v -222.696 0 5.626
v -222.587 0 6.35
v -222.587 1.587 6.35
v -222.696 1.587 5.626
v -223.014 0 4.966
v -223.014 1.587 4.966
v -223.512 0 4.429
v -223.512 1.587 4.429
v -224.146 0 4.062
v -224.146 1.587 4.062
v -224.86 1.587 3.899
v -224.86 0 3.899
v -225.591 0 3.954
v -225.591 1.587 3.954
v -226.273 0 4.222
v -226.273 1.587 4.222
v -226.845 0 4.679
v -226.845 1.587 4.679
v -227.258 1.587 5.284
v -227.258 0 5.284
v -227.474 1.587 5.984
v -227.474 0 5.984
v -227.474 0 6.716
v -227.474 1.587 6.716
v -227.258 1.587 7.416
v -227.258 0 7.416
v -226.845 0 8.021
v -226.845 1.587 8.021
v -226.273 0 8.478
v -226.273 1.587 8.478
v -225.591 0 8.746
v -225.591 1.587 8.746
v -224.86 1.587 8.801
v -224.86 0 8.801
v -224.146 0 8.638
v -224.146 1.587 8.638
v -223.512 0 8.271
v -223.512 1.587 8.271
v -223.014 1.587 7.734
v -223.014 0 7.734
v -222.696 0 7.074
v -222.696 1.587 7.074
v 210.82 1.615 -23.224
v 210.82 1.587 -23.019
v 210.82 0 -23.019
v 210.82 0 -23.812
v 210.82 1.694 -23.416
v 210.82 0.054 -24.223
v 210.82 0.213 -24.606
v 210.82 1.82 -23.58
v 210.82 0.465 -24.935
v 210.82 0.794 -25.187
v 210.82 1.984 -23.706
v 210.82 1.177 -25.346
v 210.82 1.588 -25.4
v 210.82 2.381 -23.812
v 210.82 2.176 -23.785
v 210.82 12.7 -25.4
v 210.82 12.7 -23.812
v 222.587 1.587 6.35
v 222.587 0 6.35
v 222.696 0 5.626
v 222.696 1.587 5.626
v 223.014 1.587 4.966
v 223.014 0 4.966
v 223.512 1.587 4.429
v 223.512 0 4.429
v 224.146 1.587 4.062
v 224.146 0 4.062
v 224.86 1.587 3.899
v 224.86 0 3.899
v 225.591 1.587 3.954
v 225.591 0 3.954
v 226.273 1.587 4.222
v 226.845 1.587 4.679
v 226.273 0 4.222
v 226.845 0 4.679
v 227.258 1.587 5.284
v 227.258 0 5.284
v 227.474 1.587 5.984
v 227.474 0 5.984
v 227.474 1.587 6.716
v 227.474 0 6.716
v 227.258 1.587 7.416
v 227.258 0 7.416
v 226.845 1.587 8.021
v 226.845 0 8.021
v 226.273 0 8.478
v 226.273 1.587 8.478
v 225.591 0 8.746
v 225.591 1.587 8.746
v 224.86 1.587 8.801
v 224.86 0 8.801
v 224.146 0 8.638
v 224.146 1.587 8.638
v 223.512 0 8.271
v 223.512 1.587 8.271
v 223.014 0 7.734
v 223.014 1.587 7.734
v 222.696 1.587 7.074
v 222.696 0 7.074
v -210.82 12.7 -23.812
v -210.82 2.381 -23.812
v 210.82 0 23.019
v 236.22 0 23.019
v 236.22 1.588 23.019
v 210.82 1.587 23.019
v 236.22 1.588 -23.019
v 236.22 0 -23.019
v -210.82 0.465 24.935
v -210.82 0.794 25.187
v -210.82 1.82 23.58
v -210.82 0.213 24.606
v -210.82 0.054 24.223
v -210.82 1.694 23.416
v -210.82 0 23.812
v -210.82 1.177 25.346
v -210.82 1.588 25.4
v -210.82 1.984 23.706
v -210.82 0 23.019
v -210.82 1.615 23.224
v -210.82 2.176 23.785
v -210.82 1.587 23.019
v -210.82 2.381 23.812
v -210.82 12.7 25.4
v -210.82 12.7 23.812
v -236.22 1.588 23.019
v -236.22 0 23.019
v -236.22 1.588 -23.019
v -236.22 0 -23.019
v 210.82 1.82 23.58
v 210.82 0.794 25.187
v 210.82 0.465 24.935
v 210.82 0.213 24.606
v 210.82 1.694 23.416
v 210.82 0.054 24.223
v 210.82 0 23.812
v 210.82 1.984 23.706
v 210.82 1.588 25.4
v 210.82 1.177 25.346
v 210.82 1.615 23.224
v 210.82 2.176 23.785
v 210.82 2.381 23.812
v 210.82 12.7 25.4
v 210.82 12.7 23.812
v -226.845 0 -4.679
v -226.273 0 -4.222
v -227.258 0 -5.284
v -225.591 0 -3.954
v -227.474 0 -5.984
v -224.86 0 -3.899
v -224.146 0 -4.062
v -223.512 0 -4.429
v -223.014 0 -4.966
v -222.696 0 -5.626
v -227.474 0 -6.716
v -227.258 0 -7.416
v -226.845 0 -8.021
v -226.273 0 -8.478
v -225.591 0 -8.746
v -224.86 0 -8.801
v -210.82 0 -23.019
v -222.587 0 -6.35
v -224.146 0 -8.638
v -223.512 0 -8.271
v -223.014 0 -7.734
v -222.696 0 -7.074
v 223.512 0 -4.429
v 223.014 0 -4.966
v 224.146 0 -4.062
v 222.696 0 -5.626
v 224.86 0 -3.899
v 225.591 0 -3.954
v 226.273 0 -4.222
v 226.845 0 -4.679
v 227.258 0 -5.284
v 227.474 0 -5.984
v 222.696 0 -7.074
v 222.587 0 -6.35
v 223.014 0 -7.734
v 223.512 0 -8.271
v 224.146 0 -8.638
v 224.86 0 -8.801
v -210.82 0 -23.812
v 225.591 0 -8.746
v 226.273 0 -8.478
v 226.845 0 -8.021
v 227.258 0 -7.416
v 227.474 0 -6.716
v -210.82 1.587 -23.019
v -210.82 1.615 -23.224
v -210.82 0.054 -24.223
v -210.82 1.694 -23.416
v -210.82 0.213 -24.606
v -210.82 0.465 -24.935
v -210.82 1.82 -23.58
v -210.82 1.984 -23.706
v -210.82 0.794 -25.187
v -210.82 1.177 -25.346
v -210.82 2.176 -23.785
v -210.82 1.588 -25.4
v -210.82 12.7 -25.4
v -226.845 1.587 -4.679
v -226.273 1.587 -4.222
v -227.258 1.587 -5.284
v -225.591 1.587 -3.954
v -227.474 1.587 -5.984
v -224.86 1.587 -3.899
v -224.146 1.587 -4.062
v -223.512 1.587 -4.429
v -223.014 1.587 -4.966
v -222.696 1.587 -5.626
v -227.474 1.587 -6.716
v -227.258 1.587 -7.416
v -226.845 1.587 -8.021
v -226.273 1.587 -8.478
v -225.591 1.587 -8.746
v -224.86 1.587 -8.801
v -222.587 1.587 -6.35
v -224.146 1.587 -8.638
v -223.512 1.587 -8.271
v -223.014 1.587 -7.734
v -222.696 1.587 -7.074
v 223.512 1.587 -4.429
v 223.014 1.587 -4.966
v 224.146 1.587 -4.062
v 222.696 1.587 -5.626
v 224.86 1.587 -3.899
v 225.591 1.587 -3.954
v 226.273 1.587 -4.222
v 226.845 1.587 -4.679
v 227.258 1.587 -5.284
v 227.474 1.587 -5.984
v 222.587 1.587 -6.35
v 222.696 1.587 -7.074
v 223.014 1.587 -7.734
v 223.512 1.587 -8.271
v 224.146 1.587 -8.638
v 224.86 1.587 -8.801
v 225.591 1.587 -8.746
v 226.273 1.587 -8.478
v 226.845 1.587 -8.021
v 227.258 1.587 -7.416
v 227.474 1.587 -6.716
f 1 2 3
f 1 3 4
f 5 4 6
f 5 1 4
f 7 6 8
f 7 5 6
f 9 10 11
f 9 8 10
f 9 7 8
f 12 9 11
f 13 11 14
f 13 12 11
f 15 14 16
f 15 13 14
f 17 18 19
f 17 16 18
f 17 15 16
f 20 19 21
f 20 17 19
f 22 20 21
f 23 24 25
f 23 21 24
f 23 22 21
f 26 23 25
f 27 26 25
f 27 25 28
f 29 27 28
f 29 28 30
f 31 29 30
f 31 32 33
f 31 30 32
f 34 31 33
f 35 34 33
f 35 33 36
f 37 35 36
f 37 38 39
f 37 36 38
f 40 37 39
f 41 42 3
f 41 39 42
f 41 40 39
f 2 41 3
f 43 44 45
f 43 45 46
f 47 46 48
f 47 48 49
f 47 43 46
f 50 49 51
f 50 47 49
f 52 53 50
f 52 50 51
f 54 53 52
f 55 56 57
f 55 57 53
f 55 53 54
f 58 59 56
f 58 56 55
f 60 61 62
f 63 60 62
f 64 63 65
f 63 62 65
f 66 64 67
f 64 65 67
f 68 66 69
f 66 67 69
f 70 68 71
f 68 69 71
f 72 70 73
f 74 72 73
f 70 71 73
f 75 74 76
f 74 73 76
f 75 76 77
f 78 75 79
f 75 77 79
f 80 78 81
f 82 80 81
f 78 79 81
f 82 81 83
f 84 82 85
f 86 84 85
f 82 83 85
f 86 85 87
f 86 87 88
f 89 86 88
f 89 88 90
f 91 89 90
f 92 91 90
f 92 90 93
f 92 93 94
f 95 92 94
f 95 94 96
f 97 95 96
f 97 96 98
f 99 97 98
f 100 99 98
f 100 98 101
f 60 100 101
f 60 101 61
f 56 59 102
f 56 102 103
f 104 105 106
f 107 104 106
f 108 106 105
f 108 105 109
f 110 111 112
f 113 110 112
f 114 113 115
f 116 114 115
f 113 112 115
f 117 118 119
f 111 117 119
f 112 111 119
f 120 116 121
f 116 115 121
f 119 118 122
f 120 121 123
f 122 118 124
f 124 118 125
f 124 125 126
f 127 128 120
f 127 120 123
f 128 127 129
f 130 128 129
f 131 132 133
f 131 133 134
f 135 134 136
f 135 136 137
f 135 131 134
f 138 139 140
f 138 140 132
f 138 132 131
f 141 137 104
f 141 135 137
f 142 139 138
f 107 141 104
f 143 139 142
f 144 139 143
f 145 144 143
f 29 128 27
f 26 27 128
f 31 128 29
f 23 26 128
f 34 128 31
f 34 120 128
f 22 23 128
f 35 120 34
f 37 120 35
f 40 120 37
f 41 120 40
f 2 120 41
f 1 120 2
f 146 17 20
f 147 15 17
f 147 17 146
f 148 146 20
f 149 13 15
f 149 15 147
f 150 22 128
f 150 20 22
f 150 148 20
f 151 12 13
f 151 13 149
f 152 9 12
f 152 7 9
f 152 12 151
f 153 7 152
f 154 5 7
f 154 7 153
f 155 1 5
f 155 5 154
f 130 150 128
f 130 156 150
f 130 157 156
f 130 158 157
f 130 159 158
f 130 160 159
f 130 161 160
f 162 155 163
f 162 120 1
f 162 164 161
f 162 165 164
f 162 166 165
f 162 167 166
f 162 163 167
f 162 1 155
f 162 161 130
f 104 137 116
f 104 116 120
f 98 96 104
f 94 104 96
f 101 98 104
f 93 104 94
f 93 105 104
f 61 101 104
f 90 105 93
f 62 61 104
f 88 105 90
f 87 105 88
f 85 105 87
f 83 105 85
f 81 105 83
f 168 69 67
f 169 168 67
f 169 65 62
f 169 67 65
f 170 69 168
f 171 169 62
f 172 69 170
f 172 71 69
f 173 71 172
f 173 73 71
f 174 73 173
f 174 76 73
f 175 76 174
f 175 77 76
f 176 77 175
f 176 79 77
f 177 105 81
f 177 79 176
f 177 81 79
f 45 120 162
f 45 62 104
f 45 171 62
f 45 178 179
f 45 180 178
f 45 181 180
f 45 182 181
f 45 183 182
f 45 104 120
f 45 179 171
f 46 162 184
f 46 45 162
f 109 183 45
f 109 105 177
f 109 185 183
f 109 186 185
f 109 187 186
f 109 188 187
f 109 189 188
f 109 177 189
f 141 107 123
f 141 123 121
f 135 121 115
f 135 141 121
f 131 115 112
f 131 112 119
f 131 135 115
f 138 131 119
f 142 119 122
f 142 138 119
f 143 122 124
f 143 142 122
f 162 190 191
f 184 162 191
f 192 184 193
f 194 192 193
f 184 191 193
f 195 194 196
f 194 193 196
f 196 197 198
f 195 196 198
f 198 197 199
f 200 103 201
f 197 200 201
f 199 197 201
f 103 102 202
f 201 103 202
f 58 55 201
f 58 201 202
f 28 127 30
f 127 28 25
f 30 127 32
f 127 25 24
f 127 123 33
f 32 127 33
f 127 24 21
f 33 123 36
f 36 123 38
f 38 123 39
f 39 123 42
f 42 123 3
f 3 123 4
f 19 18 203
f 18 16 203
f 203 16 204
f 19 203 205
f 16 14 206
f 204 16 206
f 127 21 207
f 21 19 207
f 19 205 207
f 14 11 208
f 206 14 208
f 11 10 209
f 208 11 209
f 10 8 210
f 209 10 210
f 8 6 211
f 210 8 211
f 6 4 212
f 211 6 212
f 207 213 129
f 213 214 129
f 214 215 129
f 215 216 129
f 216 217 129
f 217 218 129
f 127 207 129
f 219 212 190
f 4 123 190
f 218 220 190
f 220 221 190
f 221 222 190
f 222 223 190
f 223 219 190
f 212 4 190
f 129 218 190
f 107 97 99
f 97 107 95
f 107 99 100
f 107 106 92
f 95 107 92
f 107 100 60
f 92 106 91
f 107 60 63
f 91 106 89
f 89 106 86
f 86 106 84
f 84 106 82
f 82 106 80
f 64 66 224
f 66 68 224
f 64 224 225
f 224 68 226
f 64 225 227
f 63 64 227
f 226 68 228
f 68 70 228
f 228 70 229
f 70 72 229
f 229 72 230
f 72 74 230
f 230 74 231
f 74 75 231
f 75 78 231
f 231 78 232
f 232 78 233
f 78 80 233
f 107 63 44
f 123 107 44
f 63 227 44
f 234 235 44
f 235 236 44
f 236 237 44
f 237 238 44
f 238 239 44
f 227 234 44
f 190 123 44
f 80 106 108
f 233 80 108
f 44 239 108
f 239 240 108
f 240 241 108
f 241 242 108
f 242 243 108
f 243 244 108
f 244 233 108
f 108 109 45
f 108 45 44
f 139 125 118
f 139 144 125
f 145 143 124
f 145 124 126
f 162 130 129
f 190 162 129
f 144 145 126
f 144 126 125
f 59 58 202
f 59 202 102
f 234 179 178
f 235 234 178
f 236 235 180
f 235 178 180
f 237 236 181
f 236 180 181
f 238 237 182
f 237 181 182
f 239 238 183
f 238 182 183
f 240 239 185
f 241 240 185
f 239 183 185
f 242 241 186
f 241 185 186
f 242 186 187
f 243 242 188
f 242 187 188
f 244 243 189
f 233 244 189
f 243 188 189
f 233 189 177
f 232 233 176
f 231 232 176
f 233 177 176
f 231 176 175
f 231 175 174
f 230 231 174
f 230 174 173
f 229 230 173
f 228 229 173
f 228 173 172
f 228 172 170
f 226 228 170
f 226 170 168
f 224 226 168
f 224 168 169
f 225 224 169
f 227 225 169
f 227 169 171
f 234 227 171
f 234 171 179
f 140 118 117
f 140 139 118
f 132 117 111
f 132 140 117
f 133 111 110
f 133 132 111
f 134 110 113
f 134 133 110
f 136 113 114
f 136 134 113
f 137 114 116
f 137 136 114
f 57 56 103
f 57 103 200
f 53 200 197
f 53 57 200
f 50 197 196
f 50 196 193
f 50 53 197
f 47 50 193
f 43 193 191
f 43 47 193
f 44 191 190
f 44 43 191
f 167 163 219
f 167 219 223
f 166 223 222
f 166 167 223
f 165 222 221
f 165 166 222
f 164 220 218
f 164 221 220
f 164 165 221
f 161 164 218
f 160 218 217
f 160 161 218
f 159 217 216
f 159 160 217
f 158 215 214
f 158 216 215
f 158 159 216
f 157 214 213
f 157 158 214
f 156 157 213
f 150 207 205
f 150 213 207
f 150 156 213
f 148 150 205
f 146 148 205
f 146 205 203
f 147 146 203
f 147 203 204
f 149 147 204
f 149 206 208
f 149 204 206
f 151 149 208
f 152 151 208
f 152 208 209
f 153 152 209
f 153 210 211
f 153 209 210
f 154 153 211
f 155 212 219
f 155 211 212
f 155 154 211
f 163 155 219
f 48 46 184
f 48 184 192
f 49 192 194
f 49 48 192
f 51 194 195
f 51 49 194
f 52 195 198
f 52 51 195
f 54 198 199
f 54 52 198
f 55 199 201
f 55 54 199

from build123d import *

# Parameters (mm, degrees)
BOSS_EXTRUDE1_DEPTH   = 210.82
SKETCH2_W             = 46.0375
SKETCH2_H             = 1.5875
BOSS_EXTRUDE2_DEPTH   = 25.4
SKETCH3_R             = 0.635
CUT_EXTRUDE1_DEPTH    = 238.841409465
F_8_CLEARANCE_HOLE1_D = 4.9149


with BuildPart() as part:
    # Sketch1 → Boss-Extrude1 (new body)
    with BuildSketch(Plane(origin=(0, 0, 0), x_dir=(0, 0, -1), z_dir=(1, 0, 0))):
        with BuildLine():
            Line((-23.8125, 0), (23.8125, 0))
            ThreePointArc((23.8125, 0), (24.935032015, 0.464967985), (25.4, 1.5875))
            Line((25.4, 1.5875), (25.4, 12.7))
            Line((25.4, 12.7), (23.8125, 12.7))
            Line((23.8125, 12.7), (23.8125, 2.38125))
            ThreePointArc((23.8125, 2.38125), (23.580016008, 1.819983992), (23.01875, 1.5875))
            Line((23.01875, 1.5875), (-23.01875, 1.5875))
            ThreePointArc((-23.01875, 1.5875), (-23.580016008, 1.819983992), (-23.8125, 2.38125))
            Line((-23.8125, 2.38125), (-23.8125, 12.7))
            Line((-23.8125, 12.7), (-25.4, 12.7))
            Line((-25.4, 12.7), (-25.4, 1.5875))
            ThreePointArc((-25.4, 1.5875), (-24.935032015, 0.464967985), (-23.8125, 0))
        make_face()
    boss_extrude1 = extrude(amount=BOSS_EXTRUDE1_DEPTH)

    # Sketch2 → Boss-Extrude2 (add)
    with BuildSketch(Plane(origin=(210.82, 0, 0), x_dir=(0, 0, -1), z_dir=(1, 0, 0))):
        with Locations((0, 0.79375)):
            Rectangle(SKETCH2_W, SKETCH2_H)
    boss_extrude2 = extrude(amount=BOSS_EXTRUDE2_DEPTH)

    # Mirror1: Boss-Extrude1, Boss-Extrude2 across plane
    add(boss_extrude1.mirror(Plane(origin=(0, 0, 0), x_dir=(0, 0, 1), z_dir=(1, 0, 0))))
    add(boss_extrude2.mirror(Plane(origin=(0, 0, 0), x_dir=(0, 0, 1), z_dir=(1, 0, 0))))

    # Sketch3 → Cut-Extrude1 (cut, through all)
    with BuildSketch(Plane(origin=(0, 1.5875, 0), x_dir=(1, 0, 0), z_dir=(0, 1, 0))):
        with Locations(Location((225.044, -6.35, 0), (0, 0, 270))):
            Circle(SKETCH3_R)
        with Locations(Location((225.044, 6.35, 0), (0, 0, 270))):
            Circle(SKETCH3_R)
    extrude(amount=-CUT_EXTRUDE1_DEPTH, mode=Mode.SUBTRACT)

    # #8 Clearance Hole1 (through all)
    with Locations(Plane(origin=(0, 1.5875, 0), x_dir=(1, 0, 0), z_dir=(0, 1, 0))):
        with Locations((225.044, -6.35), (225.044, 6.35)):
            f_8_clearance_hole1 = Hole(F_8_CLEARANCE_HOLE1_D / 2)

    # Mirror2: #8 Clearance Hole1 across plane
    add(f_8_clearance_hole1.mirror(Plane(origin=(0, 0, 0), x_dir=(0, 0, 1), z_dir=(1, 0, 0))), mode=Mode.SUBTRACT)


solid = part.part
